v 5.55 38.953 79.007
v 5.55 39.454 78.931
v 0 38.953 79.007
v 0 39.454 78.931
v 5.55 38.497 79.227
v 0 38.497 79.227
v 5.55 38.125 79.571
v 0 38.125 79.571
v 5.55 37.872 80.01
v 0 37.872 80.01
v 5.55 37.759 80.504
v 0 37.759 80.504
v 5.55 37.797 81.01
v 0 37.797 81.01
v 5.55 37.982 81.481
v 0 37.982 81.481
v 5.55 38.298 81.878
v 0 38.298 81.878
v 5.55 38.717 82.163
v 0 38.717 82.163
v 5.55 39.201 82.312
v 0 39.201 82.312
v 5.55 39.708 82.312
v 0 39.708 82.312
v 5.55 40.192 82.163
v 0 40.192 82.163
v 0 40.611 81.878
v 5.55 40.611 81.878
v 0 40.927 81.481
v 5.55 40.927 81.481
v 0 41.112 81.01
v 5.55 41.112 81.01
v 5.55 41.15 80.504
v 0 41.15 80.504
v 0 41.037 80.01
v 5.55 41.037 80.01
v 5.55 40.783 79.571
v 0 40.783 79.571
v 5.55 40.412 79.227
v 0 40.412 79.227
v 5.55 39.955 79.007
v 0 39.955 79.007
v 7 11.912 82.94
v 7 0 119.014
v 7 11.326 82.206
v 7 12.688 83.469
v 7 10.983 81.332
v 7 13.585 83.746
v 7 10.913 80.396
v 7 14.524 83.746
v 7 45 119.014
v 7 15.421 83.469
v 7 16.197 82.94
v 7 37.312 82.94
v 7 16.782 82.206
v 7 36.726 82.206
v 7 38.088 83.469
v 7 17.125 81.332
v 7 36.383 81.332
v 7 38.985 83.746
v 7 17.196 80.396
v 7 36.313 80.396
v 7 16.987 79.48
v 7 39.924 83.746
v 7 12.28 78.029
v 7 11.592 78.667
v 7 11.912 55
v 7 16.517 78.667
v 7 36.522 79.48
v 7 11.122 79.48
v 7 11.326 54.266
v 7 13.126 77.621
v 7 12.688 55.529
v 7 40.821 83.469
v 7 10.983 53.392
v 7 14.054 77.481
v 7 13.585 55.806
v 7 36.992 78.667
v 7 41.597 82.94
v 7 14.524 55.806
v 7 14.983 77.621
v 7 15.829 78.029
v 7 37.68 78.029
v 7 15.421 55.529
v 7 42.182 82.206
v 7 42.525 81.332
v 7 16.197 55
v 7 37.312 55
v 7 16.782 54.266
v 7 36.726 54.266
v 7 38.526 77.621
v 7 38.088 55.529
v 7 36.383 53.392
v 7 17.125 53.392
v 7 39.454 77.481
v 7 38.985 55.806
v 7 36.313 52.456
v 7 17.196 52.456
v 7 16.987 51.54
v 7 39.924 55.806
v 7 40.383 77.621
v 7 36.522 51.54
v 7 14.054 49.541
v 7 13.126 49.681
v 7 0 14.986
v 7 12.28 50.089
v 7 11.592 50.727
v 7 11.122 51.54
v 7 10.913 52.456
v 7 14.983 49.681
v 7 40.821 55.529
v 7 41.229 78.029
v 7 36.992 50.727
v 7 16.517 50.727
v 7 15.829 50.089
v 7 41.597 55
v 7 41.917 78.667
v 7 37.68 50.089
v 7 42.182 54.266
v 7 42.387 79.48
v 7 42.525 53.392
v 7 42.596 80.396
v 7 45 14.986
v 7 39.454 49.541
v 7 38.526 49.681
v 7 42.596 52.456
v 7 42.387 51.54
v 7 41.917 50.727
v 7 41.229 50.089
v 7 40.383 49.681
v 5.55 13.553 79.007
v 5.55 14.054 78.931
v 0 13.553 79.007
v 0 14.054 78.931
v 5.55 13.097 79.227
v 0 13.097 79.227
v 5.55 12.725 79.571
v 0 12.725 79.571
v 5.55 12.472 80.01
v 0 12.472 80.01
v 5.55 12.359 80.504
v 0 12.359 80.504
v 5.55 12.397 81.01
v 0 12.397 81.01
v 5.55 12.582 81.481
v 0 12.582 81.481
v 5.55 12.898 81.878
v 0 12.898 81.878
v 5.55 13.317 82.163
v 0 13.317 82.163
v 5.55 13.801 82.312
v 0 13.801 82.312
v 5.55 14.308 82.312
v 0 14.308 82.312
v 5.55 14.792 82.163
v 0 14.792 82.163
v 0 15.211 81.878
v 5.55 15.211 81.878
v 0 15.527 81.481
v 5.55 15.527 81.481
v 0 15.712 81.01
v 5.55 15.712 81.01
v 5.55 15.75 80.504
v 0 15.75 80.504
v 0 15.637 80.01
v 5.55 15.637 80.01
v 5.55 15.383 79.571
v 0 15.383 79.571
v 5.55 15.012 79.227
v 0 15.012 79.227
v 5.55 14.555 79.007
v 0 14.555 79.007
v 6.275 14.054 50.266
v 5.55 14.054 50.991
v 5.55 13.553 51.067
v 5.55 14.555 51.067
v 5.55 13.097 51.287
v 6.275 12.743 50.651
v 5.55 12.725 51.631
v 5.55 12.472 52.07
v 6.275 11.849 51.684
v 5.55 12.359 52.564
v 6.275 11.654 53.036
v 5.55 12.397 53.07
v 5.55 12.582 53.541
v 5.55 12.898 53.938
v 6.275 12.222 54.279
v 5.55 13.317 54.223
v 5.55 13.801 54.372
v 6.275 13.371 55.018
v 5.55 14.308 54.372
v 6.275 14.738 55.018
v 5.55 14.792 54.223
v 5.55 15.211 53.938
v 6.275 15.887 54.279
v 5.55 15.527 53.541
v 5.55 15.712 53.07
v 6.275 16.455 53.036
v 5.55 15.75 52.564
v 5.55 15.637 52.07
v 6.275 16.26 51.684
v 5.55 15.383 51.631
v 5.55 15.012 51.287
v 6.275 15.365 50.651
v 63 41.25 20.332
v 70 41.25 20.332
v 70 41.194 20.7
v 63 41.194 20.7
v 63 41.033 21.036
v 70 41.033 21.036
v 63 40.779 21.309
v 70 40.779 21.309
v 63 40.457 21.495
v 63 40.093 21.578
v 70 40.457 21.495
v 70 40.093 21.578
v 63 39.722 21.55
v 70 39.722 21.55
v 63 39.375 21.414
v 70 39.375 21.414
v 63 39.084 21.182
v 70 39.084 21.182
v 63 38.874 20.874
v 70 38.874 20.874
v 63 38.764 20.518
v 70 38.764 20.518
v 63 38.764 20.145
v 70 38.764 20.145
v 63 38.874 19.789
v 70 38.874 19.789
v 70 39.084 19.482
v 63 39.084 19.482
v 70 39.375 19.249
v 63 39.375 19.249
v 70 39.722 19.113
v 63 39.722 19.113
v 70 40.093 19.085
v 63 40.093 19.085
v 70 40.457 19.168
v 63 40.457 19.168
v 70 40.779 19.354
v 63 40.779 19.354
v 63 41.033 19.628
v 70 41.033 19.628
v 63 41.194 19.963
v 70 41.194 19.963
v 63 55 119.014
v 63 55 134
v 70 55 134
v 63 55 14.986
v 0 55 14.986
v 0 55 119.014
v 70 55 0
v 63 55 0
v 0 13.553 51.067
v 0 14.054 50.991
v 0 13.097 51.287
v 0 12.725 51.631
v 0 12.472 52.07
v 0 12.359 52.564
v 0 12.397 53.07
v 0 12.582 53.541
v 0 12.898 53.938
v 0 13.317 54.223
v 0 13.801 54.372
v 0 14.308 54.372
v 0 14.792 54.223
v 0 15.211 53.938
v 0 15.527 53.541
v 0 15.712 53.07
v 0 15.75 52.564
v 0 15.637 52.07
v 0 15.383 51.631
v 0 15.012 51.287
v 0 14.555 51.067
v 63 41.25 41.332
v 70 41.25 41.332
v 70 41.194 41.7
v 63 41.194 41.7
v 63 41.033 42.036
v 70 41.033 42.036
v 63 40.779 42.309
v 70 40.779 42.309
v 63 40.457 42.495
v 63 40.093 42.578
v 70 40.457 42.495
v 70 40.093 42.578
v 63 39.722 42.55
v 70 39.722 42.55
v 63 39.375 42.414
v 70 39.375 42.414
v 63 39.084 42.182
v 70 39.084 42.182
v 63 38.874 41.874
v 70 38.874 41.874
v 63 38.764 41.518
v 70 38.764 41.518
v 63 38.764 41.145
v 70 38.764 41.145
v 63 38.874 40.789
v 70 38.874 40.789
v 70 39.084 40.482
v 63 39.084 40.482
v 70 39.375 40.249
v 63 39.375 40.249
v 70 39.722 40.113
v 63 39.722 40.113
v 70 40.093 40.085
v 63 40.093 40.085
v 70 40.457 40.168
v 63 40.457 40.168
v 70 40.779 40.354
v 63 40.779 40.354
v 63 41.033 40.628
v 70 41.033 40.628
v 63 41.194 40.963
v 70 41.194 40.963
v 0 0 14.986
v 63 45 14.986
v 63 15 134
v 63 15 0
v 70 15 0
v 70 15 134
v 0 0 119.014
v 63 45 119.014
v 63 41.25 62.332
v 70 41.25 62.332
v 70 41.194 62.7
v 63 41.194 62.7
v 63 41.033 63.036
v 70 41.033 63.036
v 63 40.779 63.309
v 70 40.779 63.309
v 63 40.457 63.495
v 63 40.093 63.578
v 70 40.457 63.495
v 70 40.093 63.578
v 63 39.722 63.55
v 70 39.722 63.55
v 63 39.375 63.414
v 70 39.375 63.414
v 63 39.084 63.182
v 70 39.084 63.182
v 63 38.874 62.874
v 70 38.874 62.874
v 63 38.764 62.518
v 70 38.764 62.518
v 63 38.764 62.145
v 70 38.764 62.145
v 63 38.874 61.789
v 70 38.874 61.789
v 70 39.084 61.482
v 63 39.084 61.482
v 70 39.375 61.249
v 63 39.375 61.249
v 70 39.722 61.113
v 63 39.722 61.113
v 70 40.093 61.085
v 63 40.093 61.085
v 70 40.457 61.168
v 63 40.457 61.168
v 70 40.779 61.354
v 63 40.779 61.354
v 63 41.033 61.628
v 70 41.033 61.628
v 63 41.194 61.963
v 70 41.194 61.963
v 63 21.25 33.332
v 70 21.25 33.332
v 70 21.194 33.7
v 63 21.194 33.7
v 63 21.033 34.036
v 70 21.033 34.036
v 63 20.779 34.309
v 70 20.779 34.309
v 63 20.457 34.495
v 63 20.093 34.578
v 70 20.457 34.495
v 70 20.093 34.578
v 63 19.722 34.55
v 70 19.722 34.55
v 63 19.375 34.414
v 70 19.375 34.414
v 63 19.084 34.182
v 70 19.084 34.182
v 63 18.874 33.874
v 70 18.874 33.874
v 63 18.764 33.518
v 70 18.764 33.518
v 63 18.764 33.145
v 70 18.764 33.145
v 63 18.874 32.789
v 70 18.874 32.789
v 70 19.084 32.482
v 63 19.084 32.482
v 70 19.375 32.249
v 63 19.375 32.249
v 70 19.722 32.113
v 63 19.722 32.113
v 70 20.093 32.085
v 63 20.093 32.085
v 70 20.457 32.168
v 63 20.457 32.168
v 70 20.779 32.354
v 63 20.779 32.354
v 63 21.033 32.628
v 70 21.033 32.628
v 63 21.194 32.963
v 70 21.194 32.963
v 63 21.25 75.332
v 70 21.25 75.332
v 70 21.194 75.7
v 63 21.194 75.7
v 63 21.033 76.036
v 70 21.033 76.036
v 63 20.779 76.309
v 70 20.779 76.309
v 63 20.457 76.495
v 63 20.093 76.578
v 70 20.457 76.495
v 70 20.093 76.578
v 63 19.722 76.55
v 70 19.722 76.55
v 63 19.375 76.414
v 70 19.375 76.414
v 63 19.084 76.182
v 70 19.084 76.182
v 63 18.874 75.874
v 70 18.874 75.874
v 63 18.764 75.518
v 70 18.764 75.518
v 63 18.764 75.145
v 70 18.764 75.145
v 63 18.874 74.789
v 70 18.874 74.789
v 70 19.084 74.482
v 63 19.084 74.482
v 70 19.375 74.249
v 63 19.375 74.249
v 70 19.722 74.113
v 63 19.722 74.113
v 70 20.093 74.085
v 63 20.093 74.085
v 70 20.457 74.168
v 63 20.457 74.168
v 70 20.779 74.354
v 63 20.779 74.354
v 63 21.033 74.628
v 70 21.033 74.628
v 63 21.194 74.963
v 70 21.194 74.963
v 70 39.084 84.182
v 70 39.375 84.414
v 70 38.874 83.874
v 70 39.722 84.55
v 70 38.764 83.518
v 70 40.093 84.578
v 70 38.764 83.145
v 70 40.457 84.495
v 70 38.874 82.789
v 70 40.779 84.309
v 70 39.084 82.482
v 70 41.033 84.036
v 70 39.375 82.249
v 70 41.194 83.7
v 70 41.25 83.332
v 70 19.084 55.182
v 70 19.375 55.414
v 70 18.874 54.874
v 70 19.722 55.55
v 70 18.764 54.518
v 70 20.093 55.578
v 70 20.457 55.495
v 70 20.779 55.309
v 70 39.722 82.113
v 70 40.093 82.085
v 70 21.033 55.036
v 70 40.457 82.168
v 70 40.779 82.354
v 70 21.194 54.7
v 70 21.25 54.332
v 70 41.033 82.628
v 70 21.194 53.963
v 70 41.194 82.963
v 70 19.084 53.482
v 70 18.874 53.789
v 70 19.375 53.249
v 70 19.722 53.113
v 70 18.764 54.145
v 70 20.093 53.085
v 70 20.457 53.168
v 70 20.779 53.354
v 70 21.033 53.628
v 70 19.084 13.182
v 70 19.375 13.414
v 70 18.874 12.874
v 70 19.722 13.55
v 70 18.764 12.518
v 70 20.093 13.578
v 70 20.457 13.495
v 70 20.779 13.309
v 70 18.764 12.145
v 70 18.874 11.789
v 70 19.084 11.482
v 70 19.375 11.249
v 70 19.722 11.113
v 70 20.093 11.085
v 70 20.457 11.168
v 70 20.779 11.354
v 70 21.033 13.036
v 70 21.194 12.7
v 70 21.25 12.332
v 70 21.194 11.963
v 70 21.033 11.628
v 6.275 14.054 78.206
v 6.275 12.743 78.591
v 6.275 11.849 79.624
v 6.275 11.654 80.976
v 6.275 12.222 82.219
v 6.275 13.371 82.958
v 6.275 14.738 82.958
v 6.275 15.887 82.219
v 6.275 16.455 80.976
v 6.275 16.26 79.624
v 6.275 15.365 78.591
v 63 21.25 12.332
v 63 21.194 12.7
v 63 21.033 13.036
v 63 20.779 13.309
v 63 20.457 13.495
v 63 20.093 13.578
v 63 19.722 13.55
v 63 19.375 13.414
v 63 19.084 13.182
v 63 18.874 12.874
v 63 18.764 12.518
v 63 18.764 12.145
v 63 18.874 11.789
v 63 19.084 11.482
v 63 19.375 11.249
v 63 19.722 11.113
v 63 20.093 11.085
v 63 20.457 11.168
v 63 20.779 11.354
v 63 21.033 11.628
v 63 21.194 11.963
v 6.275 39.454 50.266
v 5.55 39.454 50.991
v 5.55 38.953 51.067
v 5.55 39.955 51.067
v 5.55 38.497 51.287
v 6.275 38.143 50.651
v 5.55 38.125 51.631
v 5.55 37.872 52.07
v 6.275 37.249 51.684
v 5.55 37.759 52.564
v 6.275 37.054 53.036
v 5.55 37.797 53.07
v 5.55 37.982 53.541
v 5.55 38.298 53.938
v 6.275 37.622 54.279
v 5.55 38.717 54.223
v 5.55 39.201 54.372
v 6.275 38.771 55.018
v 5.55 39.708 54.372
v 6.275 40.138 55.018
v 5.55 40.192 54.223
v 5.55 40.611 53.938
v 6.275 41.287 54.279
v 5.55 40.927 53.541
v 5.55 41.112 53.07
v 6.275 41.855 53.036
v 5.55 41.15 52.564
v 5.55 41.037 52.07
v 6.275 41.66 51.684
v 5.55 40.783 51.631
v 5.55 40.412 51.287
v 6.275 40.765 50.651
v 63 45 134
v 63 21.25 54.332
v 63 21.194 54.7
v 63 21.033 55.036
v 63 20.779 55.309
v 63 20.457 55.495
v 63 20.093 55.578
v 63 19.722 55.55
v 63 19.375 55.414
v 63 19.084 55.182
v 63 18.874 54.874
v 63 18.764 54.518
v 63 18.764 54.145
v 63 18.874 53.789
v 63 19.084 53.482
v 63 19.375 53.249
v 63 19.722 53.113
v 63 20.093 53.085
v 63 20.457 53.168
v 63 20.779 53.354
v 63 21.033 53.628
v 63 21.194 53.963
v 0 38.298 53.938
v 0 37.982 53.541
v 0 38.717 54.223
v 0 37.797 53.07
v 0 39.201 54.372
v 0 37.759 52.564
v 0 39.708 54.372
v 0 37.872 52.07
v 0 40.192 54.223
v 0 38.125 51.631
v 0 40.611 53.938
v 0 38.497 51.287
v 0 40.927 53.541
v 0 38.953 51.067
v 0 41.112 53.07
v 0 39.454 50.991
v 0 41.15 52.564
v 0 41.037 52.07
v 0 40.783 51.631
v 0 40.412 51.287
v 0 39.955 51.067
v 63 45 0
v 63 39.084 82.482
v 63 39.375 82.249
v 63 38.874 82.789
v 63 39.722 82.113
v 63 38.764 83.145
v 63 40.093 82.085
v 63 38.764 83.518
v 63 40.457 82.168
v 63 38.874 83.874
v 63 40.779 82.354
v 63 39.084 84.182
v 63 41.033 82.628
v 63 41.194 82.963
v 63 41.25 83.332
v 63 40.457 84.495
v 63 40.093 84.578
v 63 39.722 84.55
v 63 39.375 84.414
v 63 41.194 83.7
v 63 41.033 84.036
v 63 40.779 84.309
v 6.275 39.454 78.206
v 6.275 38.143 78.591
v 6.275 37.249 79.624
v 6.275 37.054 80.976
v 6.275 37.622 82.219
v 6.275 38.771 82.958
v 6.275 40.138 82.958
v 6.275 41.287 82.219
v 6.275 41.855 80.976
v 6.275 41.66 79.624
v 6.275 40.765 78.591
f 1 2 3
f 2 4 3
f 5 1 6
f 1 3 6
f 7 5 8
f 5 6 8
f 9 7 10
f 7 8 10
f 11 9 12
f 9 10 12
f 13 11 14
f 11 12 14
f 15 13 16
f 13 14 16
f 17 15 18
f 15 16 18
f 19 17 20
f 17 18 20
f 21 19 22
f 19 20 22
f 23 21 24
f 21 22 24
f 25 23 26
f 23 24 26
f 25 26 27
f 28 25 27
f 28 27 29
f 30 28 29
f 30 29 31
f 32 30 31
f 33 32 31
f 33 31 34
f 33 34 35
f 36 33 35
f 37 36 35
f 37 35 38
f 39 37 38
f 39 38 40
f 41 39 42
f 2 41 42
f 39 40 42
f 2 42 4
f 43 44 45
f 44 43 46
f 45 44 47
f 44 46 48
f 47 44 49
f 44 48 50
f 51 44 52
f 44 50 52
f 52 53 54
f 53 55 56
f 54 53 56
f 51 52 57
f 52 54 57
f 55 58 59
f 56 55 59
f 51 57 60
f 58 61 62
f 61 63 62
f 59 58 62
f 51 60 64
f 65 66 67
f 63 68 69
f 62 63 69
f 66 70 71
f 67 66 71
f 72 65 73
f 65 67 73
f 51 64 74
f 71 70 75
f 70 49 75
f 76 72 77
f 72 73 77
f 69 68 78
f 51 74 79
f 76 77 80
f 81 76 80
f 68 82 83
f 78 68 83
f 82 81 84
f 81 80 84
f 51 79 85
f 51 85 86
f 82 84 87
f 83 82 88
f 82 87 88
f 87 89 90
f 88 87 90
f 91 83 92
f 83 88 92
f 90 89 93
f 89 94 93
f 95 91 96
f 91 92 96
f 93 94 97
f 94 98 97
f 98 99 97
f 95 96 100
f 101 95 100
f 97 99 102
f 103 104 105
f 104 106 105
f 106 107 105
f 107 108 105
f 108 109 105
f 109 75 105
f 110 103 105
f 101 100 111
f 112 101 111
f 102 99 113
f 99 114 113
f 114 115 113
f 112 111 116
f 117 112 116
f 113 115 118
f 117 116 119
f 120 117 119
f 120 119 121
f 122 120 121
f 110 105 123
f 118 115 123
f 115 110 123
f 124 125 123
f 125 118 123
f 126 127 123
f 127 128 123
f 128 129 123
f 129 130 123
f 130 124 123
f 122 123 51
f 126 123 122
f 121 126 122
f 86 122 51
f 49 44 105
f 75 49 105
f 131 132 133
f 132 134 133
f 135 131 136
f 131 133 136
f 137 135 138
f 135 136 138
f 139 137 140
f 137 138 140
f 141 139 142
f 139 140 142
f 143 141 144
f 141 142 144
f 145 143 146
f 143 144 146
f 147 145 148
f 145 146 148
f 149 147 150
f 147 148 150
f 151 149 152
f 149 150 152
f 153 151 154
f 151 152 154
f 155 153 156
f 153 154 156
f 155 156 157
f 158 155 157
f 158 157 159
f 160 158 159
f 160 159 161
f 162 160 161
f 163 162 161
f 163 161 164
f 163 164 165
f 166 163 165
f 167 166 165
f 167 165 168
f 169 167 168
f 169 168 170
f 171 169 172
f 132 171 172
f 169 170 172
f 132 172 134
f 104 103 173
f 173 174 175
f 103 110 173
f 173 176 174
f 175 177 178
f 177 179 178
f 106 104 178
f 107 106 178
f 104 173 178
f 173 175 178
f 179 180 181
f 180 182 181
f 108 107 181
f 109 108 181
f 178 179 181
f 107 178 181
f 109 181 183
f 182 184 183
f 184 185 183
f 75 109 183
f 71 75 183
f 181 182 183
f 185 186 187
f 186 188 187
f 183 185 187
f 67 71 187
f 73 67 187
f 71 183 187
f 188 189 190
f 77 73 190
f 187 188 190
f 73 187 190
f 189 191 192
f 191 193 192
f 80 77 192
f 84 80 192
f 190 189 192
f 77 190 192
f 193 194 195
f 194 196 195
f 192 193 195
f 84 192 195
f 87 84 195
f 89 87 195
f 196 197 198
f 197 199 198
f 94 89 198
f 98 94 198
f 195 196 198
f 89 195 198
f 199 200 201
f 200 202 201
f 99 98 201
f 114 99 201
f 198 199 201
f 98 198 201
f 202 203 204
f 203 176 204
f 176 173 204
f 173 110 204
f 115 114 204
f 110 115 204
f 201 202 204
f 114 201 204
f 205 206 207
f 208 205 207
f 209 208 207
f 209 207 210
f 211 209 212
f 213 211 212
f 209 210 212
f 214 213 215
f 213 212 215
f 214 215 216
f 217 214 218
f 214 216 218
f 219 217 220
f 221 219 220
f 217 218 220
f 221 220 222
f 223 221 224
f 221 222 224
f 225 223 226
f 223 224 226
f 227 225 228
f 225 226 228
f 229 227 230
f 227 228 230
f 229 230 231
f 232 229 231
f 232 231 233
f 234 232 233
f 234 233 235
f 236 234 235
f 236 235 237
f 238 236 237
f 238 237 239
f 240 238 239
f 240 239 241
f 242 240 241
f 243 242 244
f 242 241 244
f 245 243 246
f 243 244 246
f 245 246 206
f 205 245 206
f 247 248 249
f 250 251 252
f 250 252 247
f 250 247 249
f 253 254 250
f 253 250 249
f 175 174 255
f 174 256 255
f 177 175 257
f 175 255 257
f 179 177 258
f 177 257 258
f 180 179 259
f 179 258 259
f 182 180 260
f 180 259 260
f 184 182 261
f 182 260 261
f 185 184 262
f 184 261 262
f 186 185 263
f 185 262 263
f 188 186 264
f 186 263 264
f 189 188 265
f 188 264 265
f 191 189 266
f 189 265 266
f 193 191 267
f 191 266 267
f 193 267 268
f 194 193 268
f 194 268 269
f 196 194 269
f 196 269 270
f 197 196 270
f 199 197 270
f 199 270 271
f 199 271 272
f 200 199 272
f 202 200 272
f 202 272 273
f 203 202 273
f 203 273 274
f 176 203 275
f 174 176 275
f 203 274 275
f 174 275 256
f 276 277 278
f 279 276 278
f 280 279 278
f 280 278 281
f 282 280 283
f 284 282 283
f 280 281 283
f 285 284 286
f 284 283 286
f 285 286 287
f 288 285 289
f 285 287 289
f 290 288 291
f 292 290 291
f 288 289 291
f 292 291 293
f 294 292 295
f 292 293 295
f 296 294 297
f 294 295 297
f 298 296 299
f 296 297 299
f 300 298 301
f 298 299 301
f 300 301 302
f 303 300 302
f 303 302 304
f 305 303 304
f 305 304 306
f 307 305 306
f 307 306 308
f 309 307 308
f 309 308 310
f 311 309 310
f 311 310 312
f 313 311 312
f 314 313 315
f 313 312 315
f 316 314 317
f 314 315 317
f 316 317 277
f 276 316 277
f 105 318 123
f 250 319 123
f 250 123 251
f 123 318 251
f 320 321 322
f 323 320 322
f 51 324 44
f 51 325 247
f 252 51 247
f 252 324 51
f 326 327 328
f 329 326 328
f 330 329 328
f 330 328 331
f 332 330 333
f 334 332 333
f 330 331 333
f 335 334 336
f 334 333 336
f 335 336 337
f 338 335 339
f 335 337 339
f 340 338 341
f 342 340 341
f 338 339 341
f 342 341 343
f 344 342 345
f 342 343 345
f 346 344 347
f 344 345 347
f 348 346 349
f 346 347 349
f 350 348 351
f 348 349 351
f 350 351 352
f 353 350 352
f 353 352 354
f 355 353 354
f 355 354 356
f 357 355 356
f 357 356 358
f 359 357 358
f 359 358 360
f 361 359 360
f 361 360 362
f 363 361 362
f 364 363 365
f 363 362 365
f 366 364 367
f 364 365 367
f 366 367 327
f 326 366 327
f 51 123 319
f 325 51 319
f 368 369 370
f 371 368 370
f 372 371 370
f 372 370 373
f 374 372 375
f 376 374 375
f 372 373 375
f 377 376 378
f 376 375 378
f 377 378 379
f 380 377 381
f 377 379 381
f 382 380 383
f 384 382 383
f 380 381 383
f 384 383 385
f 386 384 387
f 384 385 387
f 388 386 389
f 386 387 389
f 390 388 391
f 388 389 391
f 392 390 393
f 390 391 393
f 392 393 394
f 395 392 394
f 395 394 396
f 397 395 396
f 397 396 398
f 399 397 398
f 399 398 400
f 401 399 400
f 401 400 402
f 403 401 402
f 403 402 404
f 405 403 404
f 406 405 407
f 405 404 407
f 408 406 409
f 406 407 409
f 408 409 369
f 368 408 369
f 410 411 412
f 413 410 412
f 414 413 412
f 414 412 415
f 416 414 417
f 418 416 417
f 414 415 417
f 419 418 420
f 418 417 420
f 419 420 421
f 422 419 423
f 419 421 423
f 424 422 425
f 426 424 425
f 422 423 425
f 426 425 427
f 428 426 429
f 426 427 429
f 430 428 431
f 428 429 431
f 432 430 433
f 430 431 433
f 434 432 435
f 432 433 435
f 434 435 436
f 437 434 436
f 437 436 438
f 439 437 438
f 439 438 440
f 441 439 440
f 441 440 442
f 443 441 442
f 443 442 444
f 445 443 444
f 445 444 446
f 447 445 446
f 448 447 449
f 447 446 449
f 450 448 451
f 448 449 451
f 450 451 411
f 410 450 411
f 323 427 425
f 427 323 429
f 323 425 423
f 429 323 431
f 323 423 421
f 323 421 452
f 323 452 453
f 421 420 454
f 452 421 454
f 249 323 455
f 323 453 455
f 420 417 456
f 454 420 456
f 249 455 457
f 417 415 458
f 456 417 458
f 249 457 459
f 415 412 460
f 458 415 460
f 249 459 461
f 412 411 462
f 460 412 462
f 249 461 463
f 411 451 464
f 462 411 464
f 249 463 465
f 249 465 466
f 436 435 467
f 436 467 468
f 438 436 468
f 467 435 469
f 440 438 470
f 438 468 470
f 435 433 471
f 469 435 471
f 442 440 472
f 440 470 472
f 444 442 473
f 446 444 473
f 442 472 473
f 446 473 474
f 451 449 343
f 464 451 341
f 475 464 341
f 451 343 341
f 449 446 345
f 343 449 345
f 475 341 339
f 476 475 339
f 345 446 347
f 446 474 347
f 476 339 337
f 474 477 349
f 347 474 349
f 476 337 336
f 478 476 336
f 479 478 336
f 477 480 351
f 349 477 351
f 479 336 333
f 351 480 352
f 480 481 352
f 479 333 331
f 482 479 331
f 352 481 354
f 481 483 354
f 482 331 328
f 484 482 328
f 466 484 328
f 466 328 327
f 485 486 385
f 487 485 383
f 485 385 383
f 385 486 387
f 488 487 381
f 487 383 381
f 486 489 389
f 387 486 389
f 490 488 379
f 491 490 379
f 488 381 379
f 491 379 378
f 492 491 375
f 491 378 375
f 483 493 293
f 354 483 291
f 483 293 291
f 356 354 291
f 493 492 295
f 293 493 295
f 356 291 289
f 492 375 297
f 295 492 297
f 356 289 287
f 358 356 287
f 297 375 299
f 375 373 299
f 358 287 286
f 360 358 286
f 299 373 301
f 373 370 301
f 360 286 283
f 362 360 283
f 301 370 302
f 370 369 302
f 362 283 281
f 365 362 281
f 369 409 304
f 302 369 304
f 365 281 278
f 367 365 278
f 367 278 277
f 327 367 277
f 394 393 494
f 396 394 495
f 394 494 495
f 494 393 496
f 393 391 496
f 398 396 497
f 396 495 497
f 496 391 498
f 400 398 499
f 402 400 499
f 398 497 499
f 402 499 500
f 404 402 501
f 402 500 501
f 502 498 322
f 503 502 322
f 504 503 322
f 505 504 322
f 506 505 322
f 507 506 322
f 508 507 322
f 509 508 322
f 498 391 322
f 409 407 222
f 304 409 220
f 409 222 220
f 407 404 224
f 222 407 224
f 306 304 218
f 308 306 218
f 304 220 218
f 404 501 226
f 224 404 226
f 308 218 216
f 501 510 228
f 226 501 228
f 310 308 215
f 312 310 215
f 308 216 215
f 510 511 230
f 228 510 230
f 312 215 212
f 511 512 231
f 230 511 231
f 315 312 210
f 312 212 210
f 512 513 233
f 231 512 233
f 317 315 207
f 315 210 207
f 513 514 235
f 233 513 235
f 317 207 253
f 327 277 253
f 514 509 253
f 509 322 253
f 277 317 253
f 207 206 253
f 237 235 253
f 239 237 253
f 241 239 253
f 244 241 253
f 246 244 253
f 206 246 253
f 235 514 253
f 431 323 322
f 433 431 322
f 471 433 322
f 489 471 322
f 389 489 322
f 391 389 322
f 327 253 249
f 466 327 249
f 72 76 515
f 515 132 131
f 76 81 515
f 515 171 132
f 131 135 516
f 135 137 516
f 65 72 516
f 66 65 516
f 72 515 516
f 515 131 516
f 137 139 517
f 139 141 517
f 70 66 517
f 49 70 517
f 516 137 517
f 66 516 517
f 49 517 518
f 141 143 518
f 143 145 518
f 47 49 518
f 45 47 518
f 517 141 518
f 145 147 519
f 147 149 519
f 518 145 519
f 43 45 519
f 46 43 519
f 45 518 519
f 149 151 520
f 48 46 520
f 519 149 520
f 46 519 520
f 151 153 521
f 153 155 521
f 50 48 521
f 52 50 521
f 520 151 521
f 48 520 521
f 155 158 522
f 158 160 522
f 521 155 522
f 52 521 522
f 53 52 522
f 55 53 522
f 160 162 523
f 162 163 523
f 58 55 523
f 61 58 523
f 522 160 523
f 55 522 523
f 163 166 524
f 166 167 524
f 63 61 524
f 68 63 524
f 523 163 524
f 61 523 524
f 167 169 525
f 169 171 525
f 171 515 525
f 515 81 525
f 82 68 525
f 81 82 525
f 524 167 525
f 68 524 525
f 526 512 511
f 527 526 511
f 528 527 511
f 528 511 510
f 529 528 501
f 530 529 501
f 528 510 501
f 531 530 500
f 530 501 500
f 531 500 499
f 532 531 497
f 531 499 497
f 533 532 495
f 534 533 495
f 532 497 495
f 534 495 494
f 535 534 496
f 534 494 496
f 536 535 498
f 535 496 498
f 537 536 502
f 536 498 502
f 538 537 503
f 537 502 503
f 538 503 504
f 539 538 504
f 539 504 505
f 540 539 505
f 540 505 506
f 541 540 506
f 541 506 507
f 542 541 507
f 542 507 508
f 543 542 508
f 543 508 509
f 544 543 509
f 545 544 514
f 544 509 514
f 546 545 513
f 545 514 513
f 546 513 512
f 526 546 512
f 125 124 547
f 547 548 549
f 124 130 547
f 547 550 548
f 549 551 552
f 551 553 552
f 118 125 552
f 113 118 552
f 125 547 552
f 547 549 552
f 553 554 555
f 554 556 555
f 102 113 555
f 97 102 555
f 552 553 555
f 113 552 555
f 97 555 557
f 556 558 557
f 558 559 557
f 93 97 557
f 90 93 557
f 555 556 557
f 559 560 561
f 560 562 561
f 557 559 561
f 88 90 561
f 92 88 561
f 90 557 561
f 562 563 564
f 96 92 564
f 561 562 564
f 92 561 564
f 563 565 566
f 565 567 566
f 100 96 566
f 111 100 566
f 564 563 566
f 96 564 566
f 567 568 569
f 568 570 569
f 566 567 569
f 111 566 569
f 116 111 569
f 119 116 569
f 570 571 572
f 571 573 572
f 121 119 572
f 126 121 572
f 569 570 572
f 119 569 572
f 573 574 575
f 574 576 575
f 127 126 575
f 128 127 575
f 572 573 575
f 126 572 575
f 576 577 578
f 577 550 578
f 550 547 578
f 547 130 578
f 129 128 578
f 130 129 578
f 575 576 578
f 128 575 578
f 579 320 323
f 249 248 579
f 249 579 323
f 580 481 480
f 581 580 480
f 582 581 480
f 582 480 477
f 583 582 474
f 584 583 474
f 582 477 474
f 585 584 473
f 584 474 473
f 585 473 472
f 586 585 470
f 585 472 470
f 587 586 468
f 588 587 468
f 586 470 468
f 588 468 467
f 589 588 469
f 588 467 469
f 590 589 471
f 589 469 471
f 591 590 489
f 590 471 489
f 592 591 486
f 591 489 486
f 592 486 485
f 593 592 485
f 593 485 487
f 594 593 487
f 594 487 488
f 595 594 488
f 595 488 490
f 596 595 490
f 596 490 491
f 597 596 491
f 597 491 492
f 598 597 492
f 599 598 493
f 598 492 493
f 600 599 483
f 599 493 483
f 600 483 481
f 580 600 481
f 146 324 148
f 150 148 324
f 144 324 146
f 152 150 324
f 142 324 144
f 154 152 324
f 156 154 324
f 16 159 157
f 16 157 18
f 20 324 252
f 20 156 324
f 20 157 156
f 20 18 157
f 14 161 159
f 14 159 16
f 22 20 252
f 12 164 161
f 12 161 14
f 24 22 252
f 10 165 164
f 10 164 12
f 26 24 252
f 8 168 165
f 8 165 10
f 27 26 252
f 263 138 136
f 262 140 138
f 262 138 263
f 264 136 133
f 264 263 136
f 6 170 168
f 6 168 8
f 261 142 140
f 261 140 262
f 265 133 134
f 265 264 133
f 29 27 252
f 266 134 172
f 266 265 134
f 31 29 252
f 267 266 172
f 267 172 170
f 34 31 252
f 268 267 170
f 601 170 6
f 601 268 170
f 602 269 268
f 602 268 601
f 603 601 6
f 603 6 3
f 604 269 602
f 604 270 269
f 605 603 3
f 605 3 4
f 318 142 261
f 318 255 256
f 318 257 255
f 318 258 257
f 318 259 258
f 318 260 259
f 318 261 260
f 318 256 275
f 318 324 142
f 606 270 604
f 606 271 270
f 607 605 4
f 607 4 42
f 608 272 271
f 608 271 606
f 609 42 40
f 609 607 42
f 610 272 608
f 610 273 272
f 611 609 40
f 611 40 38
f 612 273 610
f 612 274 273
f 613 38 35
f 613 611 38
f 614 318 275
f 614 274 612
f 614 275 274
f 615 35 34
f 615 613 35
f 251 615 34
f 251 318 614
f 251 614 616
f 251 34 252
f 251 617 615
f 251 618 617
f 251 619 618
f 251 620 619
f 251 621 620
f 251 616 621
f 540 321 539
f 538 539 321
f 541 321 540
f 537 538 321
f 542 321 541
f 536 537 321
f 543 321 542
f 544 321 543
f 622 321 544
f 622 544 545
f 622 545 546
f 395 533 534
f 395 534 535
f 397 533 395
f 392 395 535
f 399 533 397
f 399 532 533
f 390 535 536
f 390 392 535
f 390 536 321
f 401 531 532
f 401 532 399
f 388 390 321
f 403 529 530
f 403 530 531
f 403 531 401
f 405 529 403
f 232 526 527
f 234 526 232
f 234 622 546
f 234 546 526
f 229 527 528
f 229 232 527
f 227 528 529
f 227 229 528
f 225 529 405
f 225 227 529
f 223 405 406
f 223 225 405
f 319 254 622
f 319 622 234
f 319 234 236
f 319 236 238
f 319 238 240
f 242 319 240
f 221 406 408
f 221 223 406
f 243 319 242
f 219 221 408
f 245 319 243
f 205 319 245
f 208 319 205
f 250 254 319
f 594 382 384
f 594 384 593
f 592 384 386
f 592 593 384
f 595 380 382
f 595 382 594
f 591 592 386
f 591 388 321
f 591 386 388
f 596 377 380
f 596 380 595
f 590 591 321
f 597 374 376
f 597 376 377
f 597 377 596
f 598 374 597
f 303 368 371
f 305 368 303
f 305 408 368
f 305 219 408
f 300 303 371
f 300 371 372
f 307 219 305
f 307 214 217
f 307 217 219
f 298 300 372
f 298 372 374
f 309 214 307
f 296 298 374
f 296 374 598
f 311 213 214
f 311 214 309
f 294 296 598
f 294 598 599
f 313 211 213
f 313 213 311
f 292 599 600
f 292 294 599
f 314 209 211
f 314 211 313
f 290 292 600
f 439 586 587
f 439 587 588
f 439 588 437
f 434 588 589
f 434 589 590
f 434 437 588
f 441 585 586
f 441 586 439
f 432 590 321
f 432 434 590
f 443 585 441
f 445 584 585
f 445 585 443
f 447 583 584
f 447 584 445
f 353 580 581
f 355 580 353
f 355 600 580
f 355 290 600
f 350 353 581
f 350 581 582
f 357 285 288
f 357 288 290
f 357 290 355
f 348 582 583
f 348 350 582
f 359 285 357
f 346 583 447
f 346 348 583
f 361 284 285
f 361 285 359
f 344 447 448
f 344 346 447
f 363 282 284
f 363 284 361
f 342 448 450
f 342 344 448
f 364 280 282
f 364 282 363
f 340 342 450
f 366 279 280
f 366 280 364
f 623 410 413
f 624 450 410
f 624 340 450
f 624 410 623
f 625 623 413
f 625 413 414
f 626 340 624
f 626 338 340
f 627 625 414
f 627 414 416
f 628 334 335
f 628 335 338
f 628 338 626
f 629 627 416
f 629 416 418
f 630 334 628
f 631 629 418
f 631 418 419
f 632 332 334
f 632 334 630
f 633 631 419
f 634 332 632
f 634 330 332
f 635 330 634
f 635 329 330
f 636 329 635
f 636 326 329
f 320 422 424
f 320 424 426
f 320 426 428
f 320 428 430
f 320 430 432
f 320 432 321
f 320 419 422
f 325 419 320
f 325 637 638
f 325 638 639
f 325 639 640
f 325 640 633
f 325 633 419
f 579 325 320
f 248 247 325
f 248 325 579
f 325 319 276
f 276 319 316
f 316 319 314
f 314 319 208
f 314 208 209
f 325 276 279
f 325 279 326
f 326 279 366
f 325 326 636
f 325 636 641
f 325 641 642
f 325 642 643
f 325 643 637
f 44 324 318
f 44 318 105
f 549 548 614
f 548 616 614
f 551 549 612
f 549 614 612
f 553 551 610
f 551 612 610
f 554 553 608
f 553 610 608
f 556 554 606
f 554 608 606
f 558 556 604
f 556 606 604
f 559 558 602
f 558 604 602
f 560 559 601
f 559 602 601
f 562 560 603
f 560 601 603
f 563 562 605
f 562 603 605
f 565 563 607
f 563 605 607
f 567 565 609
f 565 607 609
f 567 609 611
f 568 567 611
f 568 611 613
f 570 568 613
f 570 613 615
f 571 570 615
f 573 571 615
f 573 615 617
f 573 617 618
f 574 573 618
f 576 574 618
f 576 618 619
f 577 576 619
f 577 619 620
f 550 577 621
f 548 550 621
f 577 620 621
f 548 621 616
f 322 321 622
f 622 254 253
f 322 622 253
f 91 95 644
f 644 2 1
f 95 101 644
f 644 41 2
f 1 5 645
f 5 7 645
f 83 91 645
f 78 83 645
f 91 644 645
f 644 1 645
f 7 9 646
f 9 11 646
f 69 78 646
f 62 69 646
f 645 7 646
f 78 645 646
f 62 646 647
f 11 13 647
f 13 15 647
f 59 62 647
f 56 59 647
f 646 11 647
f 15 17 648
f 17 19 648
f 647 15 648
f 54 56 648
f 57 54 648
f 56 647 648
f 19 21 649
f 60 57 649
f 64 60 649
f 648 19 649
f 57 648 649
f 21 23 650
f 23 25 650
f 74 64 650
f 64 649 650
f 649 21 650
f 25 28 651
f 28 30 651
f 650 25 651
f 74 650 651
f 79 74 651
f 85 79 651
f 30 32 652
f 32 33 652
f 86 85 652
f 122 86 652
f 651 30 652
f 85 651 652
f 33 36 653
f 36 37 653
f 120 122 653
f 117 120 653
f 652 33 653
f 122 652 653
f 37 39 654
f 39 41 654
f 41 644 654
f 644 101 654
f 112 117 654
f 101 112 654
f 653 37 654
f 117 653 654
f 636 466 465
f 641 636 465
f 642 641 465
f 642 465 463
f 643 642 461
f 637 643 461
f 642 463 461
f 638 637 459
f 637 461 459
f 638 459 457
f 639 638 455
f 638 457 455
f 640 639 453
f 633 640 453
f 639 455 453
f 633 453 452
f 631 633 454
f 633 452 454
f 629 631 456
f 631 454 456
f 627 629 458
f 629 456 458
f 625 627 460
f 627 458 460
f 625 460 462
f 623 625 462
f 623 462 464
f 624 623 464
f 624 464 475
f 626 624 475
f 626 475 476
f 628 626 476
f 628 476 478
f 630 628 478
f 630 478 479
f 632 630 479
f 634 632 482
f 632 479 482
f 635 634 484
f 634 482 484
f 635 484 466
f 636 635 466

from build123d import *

# Parameters (mm, degrees)
SKETCH1_W                                           = 70
SKETCH1_H                                           = 55
BOSS_EXTRUDE1_DEPTH                                 = 134
CUT_EXTRUDE1_DEPTH                                  = 161.875728437
CUT_EXTRUDE1_DEPTH_BACK                             = 161.875728437
SKETCH4_R                                           = 1.25
CUT_EXTRUDE4_DEPTH                                  = 7
SKETCH5_W                                           = 14.985710671
SKETCH5_H                                           = 55
CUT_EXTRUDE5_DEPTH                                  = 63
CSK_FOR_M3_COUNTERSUNK_FLAT_HEAD_SCREW1_D           = 3.4
CSK_FOR_M3_COUNTERSUNK_FLAT_HEAD_SCREW1_DEPTH       = 10
CSK_FOR_M3_COUNTERSUNK_FLAT_HEAD_SCREW1_CSINK_D     = 6.3
CSK_FOR_M3_COUNTERSUNK_FLAT_HEAD_SCREW1_CSINK_ANGLE = 90
CSK_FOR_M3_COUNTERSUNK_FLAT_HEAD_SCREW1_TIP         = 1.021463052


with BuildPart() as part:
    # Sketch1 → Boss-Extrude1 (new body)
    with BuildSketch(Plane.XY):
        with Locations((35, 27.5)):
            Rectangle(SKETCH1_W, SKETCH1_H)
    extrude(amount=BOSS_EXTRUDE1_DEPTH)

    # Sketch2 → Cut-Extrude1 (cut, two sides: drawn at the far end of the back side and taken through both)
    with BuildSketch(Plane.XY.offset(134).offset(-CUT_EXTRUDE1_DEPTH_BACK)):
        Polygon((7, 0), (7, 45), (63, 45), (63, 15), (70, 15), (70, 0), (60, 0), align=None)
    extrude(amount=CUT_EXTRUDE1_DEPTH + CUT_EXTRUDE1_DEPTH_BACK, mode=Mode.SUBTRACT)

    # Sketch4 → Cut-Extrude4 (cut)
    with BuildSketch(Plane(origin=(70, 0, 0), x_dir=(0, 0, -1), z_dir=(1, 0, 0))):
        with Locations(Location((-83.331764561, 40, 0), (0, 0, 90))):
            Circle(SKETCH4_R)
        with Locations(Location((-75.331764561, 20, 0), (0, 0, 90))):
            Circle(SKETCH4_R)
        with Locations(Location((-62.331764561, 40, 0), (0, 0, 90))):
            Circle(SKETCH4_R)
        with Locations(Location((-54.331764561, 20, 0), (0, 0, 90))):
            Circle(SKETCH4_R)
        with Locations(Location((-41.331764561, 40, 0), (0, 0, 90))):
            Circle(SKETCH4_R)
        with Locations(Location((-33.331764561, 20, 0), (0, 0, 90))):
            Circle(SKETCH4_R)
        with Locations(Location((-20.331764561, 40, 0), (0, 0, 90))):
            Circle(SKETCH4_R)
        with Locations(Location((-12.331764561, 20, 0), (0, 0, 90))):
            Circle(SKETCH4_R)
    extrude(amount=-CUT_EXTRUDE4_DEPTH, mode=Mode.SUBTRACT)

    # Sketch5 → Cut-Extrude5 (cut)
    with BuildSketch(Plane.ZY):
        with Locations((7.492855336, 27.5)):
            Rectangle(SKETCH5_W, SKETCH5_H)
        with Locations((126.507144665, 27.5)):
            Rectangle(SKETCH5_W, SKETCH5_H)
    extrude(amount=-CUT_EXTRUDE5_DEPTH, mode=Mode.SUBTRACT)

    # CSK for M3 Countersunk Flat Head Screw1
    with Locations(Plane(origin=(7, 0, 0), x_dir=(0, 0, 1), z_dir=(1, 0, 0))):
        with Locations((52.691317064, -39.454373601), (52.691317064, -14.054373601), (80.631317064, -14.054373601), (80.631317064, -39.454373601)):
            CounterSinkHole(CSK_FOR_M3_COUNTERSUNK_FLAT_HEAD_SCREW1_D / 2, CSK_FOR_M3_COUNTERSUNK_FLAT_HEAD_SCREW1_CSINK_D / 2, depth=CSK_FOR_M3_COUNTERSUNK_FLAT_HEAD_SCREW1_DEPTH, counter_sink_angle=CSK_FOR_M3_COUNTERSUNK_FLAT_HEAD_SCREW1_CSINK_ANGLE)
            with Locations((0, 0, -(CSK_FOR_M3_COUNTERSUNK_FLAT_HEAD_SCREW1_DEPTH + CSK_FOR_M3_COUNTERSUNK_FLAT_HEAD_SCREW1_TIP / 2))):  # 118° drill point
                Cone(0, CSK_FOR_M3_COUNTERSUNK_FLAT_HEAD_SCREW1_D / 2, CSK_FOR_M3_COUNTERSUNK_FLAT_HEAD_SCREW1_TIP, mode=Mode.SUBTRACT)


solid = part.part
